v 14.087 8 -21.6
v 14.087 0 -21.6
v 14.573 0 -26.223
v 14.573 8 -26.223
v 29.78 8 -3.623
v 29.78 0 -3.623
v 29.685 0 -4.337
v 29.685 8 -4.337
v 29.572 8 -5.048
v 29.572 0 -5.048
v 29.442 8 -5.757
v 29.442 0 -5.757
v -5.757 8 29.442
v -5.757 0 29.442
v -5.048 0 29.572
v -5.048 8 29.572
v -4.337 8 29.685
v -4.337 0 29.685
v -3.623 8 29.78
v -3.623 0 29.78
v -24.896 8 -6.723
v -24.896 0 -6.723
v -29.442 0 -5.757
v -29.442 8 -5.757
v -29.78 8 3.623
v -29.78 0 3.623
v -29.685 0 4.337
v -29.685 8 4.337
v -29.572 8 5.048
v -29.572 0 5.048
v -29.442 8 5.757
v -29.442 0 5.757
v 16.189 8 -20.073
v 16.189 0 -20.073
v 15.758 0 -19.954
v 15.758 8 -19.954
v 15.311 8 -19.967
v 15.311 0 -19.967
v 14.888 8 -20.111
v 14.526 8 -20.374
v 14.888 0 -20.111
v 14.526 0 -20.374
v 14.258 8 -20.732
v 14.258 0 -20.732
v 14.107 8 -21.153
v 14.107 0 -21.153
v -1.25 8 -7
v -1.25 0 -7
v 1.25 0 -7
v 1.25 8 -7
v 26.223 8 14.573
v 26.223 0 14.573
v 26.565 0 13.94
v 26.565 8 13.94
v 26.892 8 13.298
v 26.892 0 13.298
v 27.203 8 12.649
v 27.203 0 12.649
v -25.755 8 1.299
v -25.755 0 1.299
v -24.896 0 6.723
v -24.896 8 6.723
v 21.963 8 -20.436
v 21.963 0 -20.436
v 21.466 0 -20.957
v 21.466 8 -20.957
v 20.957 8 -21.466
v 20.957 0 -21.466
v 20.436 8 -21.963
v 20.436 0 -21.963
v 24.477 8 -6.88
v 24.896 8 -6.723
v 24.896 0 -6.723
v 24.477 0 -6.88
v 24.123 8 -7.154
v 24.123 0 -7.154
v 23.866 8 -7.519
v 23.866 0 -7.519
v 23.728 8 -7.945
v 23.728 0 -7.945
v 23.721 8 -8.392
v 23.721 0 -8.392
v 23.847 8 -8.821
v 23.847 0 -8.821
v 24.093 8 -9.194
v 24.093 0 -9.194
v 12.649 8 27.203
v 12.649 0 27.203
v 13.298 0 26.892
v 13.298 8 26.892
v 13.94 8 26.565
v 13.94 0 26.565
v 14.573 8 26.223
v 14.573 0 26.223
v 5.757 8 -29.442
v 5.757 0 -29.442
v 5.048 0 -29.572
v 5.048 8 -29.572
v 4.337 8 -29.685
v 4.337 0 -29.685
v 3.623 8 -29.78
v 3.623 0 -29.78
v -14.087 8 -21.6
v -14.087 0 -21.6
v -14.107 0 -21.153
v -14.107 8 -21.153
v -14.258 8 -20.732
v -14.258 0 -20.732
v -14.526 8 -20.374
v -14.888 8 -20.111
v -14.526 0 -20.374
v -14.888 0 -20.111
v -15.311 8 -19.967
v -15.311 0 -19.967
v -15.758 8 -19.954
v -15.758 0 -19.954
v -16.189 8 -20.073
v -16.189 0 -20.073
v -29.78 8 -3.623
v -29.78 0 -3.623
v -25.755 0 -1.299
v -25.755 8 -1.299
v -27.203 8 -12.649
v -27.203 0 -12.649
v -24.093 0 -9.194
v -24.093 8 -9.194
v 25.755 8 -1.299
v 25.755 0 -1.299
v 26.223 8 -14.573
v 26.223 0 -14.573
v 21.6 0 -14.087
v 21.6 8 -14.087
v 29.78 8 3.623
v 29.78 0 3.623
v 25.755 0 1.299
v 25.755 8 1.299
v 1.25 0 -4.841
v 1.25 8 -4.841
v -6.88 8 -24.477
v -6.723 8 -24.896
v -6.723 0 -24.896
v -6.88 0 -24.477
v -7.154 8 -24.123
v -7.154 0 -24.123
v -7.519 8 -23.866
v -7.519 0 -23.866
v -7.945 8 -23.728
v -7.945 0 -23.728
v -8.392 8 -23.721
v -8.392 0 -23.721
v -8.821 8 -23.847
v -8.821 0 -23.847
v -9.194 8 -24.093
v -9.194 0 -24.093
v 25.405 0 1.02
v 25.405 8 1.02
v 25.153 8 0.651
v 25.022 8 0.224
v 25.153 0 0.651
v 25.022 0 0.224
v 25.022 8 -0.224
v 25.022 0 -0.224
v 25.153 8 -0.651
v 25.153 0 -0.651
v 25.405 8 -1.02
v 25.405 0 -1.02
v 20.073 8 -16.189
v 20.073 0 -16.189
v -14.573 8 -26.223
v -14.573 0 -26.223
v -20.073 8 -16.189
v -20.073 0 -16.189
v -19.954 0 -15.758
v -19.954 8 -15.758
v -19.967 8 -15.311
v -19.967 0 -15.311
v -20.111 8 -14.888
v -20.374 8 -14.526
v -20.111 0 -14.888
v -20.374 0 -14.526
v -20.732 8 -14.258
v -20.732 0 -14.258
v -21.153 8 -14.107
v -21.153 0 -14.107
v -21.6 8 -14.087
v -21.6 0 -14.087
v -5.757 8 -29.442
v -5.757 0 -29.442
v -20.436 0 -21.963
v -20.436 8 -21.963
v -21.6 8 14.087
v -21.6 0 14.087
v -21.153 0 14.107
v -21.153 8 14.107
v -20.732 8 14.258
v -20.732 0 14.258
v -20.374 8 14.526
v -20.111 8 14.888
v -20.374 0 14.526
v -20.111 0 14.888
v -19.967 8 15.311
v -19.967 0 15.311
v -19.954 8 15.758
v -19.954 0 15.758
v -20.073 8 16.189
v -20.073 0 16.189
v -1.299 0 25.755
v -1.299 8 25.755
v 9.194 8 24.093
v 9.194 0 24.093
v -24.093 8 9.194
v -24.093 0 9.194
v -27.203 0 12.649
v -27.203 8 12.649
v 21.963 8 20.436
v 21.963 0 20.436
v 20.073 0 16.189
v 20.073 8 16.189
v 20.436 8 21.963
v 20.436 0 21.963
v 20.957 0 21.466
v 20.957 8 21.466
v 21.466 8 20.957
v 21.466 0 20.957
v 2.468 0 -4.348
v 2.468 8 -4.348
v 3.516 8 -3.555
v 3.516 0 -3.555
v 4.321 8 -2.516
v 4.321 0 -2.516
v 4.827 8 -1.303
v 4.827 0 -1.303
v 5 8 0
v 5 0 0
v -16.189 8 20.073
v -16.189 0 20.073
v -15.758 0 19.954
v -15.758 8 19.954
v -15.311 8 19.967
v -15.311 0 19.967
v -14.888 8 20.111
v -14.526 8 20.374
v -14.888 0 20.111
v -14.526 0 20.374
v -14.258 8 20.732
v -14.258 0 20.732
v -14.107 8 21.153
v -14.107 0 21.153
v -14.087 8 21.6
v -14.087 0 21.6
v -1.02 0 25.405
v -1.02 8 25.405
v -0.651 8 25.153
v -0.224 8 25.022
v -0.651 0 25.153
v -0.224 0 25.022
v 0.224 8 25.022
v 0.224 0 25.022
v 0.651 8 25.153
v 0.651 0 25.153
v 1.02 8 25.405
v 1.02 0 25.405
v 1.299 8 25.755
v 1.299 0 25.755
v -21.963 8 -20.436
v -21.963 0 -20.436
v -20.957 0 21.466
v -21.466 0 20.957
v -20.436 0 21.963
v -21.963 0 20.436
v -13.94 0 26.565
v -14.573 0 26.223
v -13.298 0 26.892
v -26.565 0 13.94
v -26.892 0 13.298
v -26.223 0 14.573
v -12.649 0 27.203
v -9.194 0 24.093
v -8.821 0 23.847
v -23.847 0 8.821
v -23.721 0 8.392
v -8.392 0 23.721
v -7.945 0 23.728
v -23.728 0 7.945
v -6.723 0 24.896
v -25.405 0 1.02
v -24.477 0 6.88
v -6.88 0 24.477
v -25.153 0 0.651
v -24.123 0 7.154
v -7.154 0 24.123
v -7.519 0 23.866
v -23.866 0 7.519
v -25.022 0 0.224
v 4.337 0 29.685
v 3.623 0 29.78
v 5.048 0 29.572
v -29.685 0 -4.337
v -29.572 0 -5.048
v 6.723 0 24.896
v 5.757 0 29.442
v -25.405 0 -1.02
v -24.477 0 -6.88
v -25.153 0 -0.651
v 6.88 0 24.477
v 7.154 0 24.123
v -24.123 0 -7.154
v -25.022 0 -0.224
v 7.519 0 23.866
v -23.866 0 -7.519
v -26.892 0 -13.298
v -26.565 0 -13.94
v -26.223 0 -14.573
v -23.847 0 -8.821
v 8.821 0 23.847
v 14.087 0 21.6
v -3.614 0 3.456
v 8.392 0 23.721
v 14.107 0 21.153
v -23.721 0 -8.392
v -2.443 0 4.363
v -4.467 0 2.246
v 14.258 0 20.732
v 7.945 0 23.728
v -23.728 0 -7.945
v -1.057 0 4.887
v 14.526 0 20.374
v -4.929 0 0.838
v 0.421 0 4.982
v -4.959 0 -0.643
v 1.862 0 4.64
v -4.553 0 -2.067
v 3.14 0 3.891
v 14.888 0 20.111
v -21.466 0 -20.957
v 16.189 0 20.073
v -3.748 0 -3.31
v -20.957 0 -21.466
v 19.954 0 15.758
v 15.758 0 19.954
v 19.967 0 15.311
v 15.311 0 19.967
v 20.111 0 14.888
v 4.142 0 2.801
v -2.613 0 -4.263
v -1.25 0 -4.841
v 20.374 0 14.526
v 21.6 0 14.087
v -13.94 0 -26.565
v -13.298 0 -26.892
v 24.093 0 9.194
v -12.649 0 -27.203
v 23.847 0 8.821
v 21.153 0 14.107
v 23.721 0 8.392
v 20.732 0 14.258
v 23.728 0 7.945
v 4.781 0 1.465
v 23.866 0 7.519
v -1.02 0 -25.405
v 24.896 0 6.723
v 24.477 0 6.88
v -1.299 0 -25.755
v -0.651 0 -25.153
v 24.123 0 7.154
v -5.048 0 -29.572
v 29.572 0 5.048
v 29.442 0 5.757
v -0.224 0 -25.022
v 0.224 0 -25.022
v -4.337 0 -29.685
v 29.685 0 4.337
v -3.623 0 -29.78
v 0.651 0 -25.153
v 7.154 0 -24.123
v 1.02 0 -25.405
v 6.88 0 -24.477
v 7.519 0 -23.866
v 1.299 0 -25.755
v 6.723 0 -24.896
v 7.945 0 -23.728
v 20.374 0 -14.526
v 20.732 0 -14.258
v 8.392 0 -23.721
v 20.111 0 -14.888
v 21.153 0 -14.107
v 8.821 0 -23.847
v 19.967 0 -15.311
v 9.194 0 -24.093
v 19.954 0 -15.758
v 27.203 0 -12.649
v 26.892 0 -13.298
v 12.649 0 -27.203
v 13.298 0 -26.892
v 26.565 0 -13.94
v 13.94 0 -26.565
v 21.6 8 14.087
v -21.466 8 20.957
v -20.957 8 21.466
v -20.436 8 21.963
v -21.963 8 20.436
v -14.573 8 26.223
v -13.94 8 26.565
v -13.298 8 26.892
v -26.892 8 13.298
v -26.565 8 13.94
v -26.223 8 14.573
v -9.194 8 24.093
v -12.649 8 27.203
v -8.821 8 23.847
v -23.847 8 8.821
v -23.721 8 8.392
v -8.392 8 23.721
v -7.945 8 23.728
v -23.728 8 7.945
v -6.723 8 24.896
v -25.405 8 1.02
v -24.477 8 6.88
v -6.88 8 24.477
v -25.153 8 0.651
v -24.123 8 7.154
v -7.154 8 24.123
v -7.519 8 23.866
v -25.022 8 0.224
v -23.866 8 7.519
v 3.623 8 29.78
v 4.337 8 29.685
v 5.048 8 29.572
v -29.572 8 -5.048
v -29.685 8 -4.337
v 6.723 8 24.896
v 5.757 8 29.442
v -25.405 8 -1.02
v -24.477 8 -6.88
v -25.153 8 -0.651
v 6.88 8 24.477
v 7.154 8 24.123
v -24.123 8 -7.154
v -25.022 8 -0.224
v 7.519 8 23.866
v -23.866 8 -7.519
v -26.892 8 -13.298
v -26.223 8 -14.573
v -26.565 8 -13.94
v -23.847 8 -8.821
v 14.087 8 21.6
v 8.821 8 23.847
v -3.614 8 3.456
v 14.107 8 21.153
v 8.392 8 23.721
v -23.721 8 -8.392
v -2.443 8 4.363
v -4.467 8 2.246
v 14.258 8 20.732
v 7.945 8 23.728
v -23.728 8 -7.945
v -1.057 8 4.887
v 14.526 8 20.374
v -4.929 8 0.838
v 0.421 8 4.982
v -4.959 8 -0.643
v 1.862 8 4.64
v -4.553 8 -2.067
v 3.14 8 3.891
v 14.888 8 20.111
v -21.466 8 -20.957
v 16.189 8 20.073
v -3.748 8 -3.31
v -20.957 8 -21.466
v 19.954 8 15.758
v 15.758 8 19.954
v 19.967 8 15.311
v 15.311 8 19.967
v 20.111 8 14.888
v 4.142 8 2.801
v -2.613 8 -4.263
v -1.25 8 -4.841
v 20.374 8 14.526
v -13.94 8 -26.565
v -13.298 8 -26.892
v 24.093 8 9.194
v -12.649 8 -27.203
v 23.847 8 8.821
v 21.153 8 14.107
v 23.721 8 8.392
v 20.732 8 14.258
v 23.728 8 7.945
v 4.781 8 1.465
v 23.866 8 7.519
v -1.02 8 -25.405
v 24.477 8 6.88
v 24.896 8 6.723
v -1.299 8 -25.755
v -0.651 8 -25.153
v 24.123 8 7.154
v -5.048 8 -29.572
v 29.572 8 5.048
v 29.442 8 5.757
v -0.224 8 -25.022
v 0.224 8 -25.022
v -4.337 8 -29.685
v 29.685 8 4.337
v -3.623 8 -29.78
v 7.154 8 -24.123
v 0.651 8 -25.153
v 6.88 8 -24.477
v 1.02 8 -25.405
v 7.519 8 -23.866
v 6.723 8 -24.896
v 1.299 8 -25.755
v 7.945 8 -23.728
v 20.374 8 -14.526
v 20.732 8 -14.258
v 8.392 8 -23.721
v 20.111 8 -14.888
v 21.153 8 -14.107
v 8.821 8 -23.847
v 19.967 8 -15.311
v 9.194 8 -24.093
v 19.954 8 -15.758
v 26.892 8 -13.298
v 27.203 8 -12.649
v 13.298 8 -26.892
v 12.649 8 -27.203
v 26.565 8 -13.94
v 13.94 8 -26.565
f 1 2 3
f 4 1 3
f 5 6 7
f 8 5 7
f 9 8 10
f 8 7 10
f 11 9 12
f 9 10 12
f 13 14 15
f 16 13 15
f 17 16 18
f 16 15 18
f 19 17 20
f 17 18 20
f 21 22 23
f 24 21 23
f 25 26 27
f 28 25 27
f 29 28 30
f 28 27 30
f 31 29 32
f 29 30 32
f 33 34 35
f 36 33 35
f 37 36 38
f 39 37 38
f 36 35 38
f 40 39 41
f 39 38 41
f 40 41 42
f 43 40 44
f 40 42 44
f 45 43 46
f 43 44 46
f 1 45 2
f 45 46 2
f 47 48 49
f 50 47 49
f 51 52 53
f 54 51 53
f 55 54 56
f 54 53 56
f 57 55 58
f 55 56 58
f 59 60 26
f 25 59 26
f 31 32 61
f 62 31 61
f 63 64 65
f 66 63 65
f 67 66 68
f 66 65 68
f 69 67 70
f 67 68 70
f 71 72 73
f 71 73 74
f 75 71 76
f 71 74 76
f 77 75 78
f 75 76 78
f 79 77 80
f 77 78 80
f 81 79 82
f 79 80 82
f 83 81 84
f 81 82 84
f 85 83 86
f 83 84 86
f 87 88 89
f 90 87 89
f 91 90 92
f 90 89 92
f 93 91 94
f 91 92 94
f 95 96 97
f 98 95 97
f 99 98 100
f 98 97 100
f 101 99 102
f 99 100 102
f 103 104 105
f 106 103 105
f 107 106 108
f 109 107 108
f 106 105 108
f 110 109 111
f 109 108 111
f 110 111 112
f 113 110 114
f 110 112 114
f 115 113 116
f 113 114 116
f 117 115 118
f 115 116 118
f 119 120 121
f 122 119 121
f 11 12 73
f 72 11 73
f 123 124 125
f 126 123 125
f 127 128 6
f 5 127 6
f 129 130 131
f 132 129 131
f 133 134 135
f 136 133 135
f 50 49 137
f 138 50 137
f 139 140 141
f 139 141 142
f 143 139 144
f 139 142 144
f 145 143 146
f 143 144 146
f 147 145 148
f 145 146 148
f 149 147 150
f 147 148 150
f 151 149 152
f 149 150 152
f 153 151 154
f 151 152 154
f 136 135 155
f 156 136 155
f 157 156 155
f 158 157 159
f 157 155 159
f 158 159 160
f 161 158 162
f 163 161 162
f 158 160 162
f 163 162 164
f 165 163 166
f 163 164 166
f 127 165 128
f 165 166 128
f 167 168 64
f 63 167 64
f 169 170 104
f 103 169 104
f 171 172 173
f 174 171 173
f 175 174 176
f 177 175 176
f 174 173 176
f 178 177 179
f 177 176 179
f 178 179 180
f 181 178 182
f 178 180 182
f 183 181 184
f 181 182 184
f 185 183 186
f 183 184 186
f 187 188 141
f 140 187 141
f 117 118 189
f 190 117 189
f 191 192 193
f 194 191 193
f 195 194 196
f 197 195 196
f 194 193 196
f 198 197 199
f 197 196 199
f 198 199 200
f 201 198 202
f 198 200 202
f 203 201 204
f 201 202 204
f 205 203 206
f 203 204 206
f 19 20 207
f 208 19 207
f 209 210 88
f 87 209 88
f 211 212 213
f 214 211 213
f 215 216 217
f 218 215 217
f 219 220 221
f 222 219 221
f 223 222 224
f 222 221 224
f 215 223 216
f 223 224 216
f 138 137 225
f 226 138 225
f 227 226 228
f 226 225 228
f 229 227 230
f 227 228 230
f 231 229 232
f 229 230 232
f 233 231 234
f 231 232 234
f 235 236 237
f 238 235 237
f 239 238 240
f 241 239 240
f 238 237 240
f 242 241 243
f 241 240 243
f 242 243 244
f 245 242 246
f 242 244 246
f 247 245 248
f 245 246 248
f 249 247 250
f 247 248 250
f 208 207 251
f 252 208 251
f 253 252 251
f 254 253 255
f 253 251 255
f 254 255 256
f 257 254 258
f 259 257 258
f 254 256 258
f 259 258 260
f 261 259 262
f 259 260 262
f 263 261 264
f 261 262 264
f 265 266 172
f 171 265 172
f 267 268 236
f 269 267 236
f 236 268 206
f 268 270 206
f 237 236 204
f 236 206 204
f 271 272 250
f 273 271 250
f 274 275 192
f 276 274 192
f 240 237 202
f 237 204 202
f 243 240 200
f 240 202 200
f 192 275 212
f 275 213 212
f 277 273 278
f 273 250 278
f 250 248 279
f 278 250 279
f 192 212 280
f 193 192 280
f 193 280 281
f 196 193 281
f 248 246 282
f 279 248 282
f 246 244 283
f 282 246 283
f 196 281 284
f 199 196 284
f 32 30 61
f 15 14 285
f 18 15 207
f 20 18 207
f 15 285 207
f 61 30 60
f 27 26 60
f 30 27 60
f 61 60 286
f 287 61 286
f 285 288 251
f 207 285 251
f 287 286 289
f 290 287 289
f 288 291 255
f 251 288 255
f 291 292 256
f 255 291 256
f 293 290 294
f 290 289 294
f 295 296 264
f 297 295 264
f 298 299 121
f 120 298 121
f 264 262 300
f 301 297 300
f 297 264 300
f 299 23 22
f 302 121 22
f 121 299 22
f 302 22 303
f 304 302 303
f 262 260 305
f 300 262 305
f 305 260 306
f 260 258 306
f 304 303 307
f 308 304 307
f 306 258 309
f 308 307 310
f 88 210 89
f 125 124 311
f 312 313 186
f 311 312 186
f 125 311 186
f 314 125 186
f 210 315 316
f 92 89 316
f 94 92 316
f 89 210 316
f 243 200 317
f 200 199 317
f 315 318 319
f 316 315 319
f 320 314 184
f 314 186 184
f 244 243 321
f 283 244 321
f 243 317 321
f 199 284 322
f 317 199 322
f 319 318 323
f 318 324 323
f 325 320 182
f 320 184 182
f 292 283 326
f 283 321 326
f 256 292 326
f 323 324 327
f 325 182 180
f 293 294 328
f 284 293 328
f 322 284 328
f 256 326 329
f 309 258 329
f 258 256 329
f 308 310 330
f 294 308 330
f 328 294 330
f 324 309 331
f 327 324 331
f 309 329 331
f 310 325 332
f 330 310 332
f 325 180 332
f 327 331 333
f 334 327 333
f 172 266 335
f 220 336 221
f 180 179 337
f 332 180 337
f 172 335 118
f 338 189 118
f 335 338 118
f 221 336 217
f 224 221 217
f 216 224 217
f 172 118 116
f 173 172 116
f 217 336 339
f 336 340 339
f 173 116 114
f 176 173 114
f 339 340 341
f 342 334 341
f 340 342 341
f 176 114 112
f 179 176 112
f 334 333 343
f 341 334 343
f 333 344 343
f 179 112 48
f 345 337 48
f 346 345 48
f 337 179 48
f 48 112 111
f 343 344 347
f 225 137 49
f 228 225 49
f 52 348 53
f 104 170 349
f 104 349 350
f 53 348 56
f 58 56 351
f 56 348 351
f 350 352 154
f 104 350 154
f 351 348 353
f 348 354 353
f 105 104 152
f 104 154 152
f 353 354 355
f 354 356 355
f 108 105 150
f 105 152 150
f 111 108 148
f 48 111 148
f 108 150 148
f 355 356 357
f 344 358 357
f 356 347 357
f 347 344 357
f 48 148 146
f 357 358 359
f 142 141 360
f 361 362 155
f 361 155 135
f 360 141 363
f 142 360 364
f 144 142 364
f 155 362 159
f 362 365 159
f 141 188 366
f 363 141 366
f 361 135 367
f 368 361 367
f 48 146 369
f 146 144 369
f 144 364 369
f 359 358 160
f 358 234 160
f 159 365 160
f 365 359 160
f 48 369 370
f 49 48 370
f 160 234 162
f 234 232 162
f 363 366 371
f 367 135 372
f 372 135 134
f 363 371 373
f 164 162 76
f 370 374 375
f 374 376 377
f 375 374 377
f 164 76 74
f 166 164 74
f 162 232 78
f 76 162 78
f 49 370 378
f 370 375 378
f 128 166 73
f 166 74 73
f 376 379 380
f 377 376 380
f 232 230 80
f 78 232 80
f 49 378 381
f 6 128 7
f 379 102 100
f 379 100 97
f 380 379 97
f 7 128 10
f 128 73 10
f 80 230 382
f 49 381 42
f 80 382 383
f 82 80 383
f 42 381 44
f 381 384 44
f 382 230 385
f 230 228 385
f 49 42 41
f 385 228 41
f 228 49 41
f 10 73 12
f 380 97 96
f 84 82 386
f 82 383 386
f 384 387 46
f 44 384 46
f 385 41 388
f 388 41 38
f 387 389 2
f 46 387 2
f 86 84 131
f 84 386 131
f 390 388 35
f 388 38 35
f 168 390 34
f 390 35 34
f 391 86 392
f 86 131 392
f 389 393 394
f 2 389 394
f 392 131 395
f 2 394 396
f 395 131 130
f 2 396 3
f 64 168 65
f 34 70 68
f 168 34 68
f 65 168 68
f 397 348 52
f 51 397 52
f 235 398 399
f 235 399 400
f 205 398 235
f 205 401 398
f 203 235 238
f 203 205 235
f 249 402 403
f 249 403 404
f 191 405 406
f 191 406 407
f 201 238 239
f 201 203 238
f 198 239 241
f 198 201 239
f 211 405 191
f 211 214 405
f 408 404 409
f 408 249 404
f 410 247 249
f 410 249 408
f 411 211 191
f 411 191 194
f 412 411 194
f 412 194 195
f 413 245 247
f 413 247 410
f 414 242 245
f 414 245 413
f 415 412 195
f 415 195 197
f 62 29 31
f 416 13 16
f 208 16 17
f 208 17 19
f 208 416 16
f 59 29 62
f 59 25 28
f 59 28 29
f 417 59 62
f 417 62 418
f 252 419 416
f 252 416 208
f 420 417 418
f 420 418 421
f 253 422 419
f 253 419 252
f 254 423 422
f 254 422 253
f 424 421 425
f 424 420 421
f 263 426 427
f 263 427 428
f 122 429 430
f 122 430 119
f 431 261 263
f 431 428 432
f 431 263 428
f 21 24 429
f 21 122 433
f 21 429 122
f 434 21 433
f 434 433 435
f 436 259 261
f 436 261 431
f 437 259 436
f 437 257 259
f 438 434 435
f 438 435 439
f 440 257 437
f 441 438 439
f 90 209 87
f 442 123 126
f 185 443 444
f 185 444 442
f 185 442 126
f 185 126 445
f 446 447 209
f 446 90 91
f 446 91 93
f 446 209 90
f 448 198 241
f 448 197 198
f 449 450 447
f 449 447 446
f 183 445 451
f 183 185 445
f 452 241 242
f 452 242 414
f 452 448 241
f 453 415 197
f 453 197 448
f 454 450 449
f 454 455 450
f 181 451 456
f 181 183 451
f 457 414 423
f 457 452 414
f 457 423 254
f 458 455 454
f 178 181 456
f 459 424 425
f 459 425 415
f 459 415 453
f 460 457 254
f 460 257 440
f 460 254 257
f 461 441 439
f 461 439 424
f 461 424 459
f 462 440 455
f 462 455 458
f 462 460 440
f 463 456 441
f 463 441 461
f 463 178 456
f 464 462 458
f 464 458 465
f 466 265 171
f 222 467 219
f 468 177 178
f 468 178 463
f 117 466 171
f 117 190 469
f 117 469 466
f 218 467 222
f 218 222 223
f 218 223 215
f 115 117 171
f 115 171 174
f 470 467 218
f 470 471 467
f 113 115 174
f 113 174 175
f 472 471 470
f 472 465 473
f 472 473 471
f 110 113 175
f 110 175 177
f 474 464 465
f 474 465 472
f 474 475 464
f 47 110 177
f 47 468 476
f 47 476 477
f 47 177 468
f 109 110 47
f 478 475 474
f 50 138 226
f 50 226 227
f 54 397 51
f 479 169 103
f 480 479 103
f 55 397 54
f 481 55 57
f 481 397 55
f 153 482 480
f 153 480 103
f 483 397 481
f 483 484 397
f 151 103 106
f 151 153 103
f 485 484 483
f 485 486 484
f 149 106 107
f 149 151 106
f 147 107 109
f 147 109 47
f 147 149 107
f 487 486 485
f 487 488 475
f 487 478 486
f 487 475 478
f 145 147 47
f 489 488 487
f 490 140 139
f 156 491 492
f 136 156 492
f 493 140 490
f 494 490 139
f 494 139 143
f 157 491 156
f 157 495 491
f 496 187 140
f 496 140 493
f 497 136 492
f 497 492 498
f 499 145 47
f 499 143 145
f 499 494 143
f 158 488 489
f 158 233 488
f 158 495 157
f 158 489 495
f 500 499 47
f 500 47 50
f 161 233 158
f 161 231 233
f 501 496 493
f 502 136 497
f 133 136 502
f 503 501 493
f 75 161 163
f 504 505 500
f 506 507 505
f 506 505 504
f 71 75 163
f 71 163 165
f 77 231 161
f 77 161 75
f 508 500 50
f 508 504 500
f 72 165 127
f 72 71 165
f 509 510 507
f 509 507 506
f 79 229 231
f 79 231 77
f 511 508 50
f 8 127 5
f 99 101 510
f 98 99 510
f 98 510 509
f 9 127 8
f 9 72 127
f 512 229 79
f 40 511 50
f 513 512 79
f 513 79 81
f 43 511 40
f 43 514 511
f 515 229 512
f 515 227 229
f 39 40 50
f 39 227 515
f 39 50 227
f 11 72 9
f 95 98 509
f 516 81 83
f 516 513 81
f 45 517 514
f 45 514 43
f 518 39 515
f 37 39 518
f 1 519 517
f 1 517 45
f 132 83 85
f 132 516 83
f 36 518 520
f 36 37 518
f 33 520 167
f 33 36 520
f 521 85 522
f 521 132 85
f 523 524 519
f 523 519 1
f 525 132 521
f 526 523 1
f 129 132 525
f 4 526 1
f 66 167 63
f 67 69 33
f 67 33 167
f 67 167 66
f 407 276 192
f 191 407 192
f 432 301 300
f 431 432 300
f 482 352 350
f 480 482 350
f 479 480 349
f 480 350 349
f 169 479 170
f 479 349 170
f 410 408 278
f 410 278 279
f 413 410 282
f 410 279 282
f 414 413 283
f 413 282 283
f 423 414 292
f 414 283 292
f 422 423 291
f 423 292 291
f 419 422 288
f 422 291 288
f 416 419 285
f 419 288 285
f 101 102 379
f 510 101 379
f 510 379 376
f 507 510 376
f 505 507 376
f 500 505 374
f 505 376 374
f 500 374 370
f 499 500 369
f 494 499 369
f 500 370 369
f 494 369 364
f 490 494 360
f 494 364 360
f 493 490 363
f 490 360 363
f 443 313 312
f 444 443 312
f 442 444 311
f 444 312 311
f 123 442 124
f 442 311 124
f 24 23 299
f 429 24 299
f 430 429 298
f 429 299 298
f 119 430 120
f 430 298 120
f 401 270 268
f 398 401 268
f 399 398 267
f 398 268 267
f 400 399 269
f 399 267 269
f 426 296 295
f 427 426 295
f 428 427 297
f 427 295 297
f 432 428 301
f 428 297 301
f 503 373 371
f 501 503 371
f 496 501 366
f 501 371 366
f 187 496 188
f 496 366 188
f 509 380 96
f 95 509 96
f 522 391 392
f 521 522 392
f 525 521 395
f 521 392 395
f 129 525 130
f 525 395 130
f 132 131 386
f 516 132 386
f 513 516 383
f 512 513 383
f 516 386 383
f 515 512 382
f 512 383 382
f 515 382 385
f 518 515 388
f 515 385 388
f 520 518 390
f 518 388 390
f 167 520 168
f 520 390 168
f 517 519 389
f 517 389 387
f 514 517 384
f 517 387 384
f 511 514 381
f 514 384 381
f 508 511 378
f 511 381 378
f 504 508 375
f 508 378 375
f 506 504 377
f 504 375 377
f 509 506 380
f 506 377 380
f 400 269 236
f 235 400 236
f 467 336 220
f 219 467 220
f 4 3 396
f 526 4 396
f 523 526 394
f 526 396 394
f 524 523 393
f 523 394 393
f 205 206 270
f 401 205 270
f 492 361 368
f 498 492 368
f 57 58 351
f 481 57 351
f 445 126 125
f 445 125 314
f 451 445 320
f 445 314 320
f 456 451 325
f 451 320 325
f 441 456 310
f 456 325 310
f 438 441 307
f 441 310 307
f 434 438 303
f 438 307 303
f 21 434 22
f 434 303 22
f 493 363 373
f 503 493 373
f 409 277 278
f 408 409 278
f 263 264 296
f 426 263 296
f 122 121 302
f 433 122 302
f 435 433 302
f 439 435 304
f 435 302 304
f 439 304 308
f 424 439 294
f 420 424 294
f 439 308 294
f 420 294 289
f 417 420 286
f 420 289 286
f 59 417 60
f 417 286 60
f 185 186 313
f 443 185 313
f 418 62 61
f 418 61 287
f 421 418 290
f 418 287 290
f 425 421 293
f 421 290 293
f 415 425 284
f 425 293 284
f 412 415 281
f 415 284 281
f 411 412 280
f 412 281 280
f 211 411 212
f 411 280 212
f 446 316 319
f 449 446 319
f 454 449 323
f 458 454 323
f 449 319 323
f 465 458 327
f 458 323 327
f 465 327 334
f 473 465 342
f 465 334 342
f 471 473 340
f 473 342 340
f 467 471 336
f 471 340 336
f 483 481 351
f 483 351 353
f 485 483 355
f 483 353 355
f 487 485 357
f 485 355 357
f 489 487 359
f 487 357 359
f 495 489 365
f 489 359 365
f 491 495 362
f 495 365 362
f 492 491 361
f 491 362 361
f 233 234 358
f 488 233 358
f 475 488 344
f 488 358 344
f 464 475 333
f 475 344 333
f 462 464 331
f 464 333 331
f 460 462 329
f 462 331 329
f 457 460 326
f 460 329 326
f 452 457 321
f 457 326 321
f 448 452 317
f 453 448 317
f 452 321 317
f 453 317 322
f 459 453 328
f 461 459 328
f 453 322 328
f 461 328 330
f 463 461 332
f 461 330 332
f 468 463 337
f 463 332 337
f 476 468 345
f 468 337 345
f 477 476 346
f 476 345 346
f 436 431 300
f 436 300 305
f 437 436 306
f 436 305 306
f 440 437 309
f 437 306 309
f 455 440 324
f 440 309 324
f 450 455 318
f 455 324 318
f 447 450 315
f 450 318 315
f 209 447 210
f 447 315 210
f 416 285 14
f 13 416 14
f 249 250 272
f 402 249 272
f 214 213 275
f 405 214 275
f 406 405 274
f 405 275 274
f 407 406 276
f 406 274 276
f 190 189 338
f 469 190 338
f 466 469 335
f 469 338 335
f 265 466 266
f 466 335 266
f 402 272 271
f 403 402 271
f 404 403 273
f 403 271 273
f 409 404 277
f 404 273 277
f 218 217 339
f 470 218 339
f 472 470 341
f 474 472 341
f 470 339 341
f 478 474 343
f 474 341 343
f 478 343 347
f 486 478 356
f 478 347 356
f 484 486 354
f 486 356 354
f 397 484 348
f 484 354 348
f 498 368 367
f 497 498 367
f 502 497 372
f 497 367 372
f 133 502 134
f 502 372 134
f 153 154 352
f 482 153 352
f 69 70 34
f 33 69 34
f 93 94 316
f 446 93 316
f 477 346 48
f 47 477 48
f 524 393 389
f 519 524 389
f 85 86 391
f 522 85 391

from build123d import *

# Parameters (mm, degrees)
BOSS_EXTRUDE1_DEPTH = 8


with BuildPart() as part:
    # Sketch1 → Boss-Extrude1 (new body)
    with BuildSketch(Plane(origin=(0, 0, 0), x_dir=(1, 0, 0), z_dir=(0, 1, 0))):
        with BuildLine():
            ThreePointArc((5.756768163, 29.44247986), (4.693033951, 29.630650218), (3.62321476, 29.780401522))
            Line((3.62321476, 29.780401522), (1.299038106, 25.754809472))
            ThreePointArc((1.299038106, 25.754809472), (0, 25.004809472), (-1.299038106, 25.754809472))
            Line((-1.299038106, 25.754809472), (-3.62321476, 29.780401522))
            ThreePointArc((-3.62321476, 29.780401522), (-4.693033951, 29.630650218), (-5.756768163, 29.44247986))
            Line((-5.756768163, 29.44247986), (-6.723215158, 24.895704225))
            ThreePointArc((-6.723215158, 24.895704225), (-7.726911068, 23.780986987), (-9.194132469, 24.092854523))
            Line((-9.194132469, 24.092854523), (-12.648532177, 27.20320999))
            ThreePointArc((-12.648532177, 27.20320999), (-13.619714992, 26.730195726), (-14.573238507, 26.222523132))
            Line((-14.573238507, 26.222523132), (-14.087353279, 21.59963399))
            ThreePointArc((-14.087353279, 21.59963399), (-14.697458244, 20.229315804), (-16.189241087, 20.072523109))
            Line((-16.189241087, 20.072523109), (-20.435723137, 21.963178729))
            ThreePointArc((-20.435723137, 21.963178729), (-21.213203436, 21.213203436), (-21.963178729, 20.435723137))
            Line((-21.963178729, 20.435723137), (-20.072523109, 16.189241087))
            ThreePointArc((-20.072523109, 16.189241087), (-20.229315804, 14.697458244), (-21.59963399, 14.087353279))
            Line((-21.59963399, 14.087353279), (-26.222523132, 14.573238507))
            ThreePointArc((-26.222523132, 14.573238507), (-26.730195726, 13.619714992), (-27.20320999, 12.648532177))
            Line((-27.20320999, 12.648532177), (-24.092854523, 9.194132469))
            ThreePointArc((-24.092854523, 9.194132469), (-23.780986987, 7.726911068), (-24.895704225, 6.723215158))
            Line((-24.895704225, 6.723215158), (-29.44247986, 5.756768163))
            ThreePointArc((-29.44247986, 5.756768163), (-29.630650218, 4.693033951), (-29.780401522, 3.62321476))
            Line((-29.780401522, 3.62321476), (-25.754809472, 1.299038106))
            ThreePointArc((-25.754809472, 1.299038106), (-25.004809472, 0), (-25.754809472, -1.299038106))
            Line((-25.754809472, -1.299038106), (-29.780401522, -3.62321476))
            ThreePointArc((-29.780401522, -3.62321476), (-29.630650218, -4.693033951), (-29.44247986, -5.756768163))
            Line((-29.44247986, -5.756768163), (-24.895704225, -6.723215158))
            ThreePointArc((-24.895704225, -6.723215158), (-23.780986987, -7.726911068), (-24.092854523, -9.194132469))
            Line((-24.092854523, -9.194132469), (-27.20320999, -12.648532177))
            ThreePointArc((-27.20320999, -12.648532177), (-26.730195726, -13.619714992), (-26.222523132, -14.573238507))
            Line((-26.222523132, -14.573238507), (-21.59963399, -14.087353279))
            ThreePointArc((-21.59963399, -14.087353279), (-20.229315804, -14.697458244), (-20.072523109, -16.189241087))
            Line((-20.072523109, -16.189241087), (-21.963178729, -20.435723137))
            ThreePointArc((-21.963178729, -20.435723137), (-21.213203436, -21.213203436), (-20.435723137, -21.963178729))
            Line((-20.435723137, -21.963178729), (-16.189241087, -20.072523109))
            ThreePointArc((-16.189241087, -20.072523109), (-14.697458244, -20.229315804), (-14.087353279, -21.59963399))
            Line((-14.087353279, -21.59963399), (-14.573238507, -26.222523132))
            ThreePointArc((-14.573238507, -26.222523132), (-13.619714992, -26.730195726), (-12.648532177, -27.20320999))
            Line((-12.648532177, -27.20320999), (-9.194132469, -24.092854523))
            ThreePointArc((-9.194132469, -24.092854523), (-7.726911068, -23.780986987), (-6.723215158, -24.895704225))
            Line((-6.723215158, -24.895704225), (-5.756768163, -29.44247986))
            ThreePointArc((-5.756768163, -29.44247986), (-4.693033951, -29.630650218), (-3.62321476, -29.780401522))
            Line((-3.62321476, -29.780401522), (-1.299038106, -25.754809472))
            ThreePointArc((-1.299038106, -25.754809472), (0, -25.004809472), (1.299038106, -25.754809472))
            Line((1.299038106, -25.754809472), (3.62321476, -29.780401522))
            ThreePointArc((3.62321476, -29.780401522), (4.693033951, -29.630650218), (5.756768163, -29.44247986))
            Line((5.756768163, -29.44247986), (6.723215158, -24.895704225))
            ThreePointArc((6.723215158, -24.895704225), (7.726911068, -23.780986987), (9.194132469, -24.092854523))
            Line((9.194132469, -24.092854523), (12.648532177, -27.20320999))
            ThreePointArc((12.648532177, -27.20320999), (13.619714992, -26.730195726), (14.573238507, -26.222523132))
            Line((14.573238507, -26.222523132), (14.087353279, -21.59963399))
            ThreePointArc((14.087353279, -21.59963399), (14.697458244, -20.229315804), (16.189241087, -20.072523109))
            Line((16.189241087, -20.072523109), (20.435723137, -21.963178729))
            ThreePointArc((20.435723137, -21.963178729), (21.213203436, -21.213203436), (21.963178729, -20.435723137))
            Line((21.963178729, -20.435723137), (20.072523109, -16.189241087))
            ThreePointArc((20.072523109, -16.189241087), (20.229315804, -14.697458244), (21.59963399, -14.087353279))
            Line((21.59963399, -14.087353279), (26.222523132, -14.573238507))
            ThreePointArc((26.222523132, -14.573238507), (26.730195726, -13.619714992), (27.20320999, -12.648532177))
            Line((27.20320999, -12.648532177), (24.092854523, -9.194132469))
            ThreePointArc((24.092854523, -9.194132469), (23.780986987, -7.726911068), (24.895704225, -6.723215158))
            Line((24.895704225, -6.723215158), (29.44247986, -5.756768163))
            ThreePointArc((29.44247986, -5.756768163), (29.630650218, -4.693033951), (29.780401522, -3.62321476))
            Line((29.780401522, -3.62321476), (25.754809472, -1.299038106))
            ThreePointArc((25.754809472, -1.299038106), (25.004809472, 0), (25.754809472, 1.299038106))
            Line((25.754809472, 1.299038106), (29.780401522, 3.62321476))
            ThreePointArc((29.780401522, 3.62321476), (29.630650218, 4.693033951), (29.44247986, 5.756768163))
            Line((29.44247986, 5.756768163), (24.895704225, 6.723215158))
            ThreePointArc((24.895704225, 6.723215158), (23.780986987, 7.726911068), (24.092854523, 9.194132469))
            Line((24.092854523, 9.194132469), (27.20320999, 12.648532177))
            ThreePointArc((27.20320999, 12.648532177), (26.730195726, 13.619714992), (26.222523132, 14.573238507))
            Line((26.222523132, 14.573238507), (21.59963399, 14.087353279))
            ThreePointArc((21.59963399, 14.087353279), (20.229315804, 14.697458244), (20.072523109, 16.189241087))
            Line((20.072523109, 16.189241087), (21.963178729, 20.435723137))
            ThreePointArc((21.963178729, 20.435723137), (21.213203436, 21.213203436), (20.435723137, 21.963178729))
            Line((20.435723137, 21.963178729), (16.189241087, 20.072523109))
            ThreePointArc((16.189241087, 20.072523109), (14.697458244, 20.229315804), (14.087353279, 21.59963399))
            Line((14.087353279, 21.59963399), (14.573238507, 26.222523132))
            ThreePointArc((14.573238507, 26.222523132), (13.619714992, 26.730195726), (12.648532177, 27.20320999))
            Line((12.648532177, 27.20320999), (9.194132469, 24.092854523))
            ThreePointArc((9.194132469, 24.092854523), (7.726911068, 23.780986987), (6.723215158, 24.895704225))
            Line((6.723215158, 24.895704225), (5.756768163, 29.44247986))
        make_face()
        with BuildLine():
            ThreePointArc((5, 0), (-3.061862178, -3.952847075), (-1.25, 4.841229183))
            Line((-1.25, 4.841229183), (-1.25, 7))
            Line((-1.25, 7), (1.25, 7))
            Line((1.25, 7), (1.25, 4.841229183))
            ThreePointArc((1.25, 4.841229183), (3.952847075, 3.061862178), (5, 0))
        make_face(mode=Mode.SUBTRACT)
    extrude(amount=BOSS_EXTRUDE1_DEPTH)


solid = part.part
